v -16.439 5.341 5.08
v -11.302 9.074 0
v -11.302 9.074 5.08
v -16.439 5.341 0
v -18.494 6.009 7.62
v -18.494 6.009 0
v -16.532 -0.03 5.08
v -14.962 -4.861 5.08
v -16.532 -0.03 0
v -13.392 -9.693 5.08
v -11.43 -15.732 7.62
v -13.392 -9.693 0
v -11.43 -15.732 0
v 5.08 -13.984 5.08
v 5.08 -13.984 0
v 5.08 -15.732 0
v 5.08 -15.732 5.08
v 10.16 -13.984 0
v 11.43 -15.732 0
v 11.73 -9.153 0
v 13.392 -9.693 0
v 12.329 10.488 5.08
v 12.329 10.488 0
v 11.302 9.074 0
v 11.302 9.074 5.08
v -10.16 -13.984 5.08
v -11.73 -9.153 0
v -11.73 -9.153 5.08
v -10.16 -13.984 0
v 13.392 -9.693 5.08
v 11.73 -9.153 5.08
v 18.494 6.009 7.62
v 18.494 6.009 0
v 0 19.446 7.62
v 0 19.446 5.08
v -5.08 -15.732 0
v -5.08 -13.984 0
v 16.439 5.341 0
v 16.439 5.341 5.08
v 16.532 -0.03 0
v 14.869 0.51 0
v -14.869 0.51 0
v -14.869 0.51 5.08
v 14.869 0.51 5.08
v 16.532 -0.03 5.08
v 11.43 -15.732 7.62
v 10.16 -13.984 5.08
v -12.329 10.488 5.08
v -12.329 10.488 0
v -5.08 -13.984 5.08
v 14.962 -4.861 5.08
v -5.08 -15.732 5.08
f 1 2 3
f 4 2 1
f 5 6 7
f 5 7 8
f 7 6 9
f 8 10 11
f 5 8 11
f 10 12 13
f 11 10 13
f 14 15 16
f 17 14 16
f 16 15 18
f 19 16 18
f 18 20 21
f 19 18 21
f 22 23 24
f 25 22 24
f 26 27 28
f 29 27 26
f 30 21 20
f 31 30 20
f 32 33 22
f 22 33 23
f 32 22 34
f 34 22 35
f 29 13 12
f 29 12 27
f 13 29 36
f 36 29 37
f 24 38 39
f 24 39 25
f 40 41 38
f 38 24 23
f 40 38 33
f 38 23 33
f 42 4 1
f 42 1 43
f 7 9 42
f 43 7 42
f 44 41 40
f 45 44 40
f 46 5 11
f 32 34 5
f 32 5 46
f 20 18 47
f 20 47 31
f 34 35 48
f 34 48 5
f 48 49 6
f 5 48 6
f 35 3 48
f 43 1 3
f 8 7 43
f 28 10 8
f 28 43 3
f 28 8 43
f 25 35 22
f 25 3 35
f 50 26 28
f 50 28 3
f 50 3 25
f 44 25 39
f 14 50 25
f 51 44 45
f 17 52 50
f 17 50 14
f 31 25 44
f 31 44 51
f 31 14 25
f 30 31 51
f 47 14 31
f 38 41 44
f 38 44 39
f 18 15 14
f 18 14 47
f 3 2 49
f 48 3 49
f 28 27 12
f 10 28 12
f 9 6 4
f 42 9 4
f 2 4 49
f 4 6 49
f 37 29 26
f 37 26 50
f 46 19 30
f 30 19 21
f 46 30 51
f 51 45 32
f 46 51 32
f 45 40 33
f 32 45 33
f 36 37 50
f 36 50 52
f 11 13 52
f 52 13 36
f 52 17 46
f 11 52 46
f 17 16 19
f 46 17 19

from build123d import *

# Parameters (mm, degrees)
F1_DEPTH = 7.62
F3_DEPTH = 5.08
F4_W     = 10.16
F4_H     = 1.748005039
F5_DEPTH = 5.08


# Not quite as in the source:
# - a feature names something its author has since deleted; it is built from what else it names


with BuildPart() as f1:
    # F0 (on Top) → F1 (new body)
    with BuildSketch(Plane.XY):
        Polygon((-11.43, -15.732045351), (11.43, -15.732045351), (18.4941284914, 6.0091066115), (0, 19.4458774789), (-18.4941284914, 6.0091066115), align=None)
    extrude(amount=F1_DEPTH)

    # F2 (on Top) → F3 (cut)
    with BuildSketch(Plane.XY):
        Polygon((10.16, -13.984040312), (16.4392253257, 5.3414280991), (0, 17.2852244257), (-16.4392253257, 5.3414280991), (-10.16, -13.984040312), align=None)
    extrude(amount=F3_DEPTH, mode=Mode.SUBTRACT)

    # F4 (on face) → F5 (cut)
    with BuildSketch(Plane(origin=(0, 0, 0), x_dir=(1, 0, 0), z_dir=(0, 0, -1))):
        Polygon((-14.8694189943, -0.5100609964), (-13.2996126628, 4.3213061064), (-14.9620642457, 4.8614693697), (-16.5318705771, 0.030102267), align=None)
        Polygon((-14.9620642457, 4.8614693697), (-13.2996126628, 4.3213061064), (-11.7298063314, 9.1526732092), (-13.3922579143, 9.6928364725), align=None)
        Polygon((11.7298063314, 9.1526732092), (13.2996126628, 4.3213061064), (14.9620642457, 4.8614693697), (13.3922579143, 9.6928364725), align=None)
        Polygon((14.9620642457, 4.8614693697), (13.2996126628, 4.3213061064), (14.8694189943, -0.5100609964), (16.5318705771, 0.030102267), align=None)
        with Locations((0, 14.8580428315)):
            Rectangle(F4_W, F4_H)
        Polygon((0, -19.4458774789), (0, -17.2852244257), (-11.3019674114, -9.0738644512), (-12.3294189943, -10.488030234), align=None)
        Polygon((11.3019674114, -9.0738644512), (0, -17.2852244257), (0, -19.4458774789), (12.3294189943, -10.488030234), align=None)
    extrude(amount=-F5_DEPTH, mode=Mode.SUBTRACT)


solid = f1.part
